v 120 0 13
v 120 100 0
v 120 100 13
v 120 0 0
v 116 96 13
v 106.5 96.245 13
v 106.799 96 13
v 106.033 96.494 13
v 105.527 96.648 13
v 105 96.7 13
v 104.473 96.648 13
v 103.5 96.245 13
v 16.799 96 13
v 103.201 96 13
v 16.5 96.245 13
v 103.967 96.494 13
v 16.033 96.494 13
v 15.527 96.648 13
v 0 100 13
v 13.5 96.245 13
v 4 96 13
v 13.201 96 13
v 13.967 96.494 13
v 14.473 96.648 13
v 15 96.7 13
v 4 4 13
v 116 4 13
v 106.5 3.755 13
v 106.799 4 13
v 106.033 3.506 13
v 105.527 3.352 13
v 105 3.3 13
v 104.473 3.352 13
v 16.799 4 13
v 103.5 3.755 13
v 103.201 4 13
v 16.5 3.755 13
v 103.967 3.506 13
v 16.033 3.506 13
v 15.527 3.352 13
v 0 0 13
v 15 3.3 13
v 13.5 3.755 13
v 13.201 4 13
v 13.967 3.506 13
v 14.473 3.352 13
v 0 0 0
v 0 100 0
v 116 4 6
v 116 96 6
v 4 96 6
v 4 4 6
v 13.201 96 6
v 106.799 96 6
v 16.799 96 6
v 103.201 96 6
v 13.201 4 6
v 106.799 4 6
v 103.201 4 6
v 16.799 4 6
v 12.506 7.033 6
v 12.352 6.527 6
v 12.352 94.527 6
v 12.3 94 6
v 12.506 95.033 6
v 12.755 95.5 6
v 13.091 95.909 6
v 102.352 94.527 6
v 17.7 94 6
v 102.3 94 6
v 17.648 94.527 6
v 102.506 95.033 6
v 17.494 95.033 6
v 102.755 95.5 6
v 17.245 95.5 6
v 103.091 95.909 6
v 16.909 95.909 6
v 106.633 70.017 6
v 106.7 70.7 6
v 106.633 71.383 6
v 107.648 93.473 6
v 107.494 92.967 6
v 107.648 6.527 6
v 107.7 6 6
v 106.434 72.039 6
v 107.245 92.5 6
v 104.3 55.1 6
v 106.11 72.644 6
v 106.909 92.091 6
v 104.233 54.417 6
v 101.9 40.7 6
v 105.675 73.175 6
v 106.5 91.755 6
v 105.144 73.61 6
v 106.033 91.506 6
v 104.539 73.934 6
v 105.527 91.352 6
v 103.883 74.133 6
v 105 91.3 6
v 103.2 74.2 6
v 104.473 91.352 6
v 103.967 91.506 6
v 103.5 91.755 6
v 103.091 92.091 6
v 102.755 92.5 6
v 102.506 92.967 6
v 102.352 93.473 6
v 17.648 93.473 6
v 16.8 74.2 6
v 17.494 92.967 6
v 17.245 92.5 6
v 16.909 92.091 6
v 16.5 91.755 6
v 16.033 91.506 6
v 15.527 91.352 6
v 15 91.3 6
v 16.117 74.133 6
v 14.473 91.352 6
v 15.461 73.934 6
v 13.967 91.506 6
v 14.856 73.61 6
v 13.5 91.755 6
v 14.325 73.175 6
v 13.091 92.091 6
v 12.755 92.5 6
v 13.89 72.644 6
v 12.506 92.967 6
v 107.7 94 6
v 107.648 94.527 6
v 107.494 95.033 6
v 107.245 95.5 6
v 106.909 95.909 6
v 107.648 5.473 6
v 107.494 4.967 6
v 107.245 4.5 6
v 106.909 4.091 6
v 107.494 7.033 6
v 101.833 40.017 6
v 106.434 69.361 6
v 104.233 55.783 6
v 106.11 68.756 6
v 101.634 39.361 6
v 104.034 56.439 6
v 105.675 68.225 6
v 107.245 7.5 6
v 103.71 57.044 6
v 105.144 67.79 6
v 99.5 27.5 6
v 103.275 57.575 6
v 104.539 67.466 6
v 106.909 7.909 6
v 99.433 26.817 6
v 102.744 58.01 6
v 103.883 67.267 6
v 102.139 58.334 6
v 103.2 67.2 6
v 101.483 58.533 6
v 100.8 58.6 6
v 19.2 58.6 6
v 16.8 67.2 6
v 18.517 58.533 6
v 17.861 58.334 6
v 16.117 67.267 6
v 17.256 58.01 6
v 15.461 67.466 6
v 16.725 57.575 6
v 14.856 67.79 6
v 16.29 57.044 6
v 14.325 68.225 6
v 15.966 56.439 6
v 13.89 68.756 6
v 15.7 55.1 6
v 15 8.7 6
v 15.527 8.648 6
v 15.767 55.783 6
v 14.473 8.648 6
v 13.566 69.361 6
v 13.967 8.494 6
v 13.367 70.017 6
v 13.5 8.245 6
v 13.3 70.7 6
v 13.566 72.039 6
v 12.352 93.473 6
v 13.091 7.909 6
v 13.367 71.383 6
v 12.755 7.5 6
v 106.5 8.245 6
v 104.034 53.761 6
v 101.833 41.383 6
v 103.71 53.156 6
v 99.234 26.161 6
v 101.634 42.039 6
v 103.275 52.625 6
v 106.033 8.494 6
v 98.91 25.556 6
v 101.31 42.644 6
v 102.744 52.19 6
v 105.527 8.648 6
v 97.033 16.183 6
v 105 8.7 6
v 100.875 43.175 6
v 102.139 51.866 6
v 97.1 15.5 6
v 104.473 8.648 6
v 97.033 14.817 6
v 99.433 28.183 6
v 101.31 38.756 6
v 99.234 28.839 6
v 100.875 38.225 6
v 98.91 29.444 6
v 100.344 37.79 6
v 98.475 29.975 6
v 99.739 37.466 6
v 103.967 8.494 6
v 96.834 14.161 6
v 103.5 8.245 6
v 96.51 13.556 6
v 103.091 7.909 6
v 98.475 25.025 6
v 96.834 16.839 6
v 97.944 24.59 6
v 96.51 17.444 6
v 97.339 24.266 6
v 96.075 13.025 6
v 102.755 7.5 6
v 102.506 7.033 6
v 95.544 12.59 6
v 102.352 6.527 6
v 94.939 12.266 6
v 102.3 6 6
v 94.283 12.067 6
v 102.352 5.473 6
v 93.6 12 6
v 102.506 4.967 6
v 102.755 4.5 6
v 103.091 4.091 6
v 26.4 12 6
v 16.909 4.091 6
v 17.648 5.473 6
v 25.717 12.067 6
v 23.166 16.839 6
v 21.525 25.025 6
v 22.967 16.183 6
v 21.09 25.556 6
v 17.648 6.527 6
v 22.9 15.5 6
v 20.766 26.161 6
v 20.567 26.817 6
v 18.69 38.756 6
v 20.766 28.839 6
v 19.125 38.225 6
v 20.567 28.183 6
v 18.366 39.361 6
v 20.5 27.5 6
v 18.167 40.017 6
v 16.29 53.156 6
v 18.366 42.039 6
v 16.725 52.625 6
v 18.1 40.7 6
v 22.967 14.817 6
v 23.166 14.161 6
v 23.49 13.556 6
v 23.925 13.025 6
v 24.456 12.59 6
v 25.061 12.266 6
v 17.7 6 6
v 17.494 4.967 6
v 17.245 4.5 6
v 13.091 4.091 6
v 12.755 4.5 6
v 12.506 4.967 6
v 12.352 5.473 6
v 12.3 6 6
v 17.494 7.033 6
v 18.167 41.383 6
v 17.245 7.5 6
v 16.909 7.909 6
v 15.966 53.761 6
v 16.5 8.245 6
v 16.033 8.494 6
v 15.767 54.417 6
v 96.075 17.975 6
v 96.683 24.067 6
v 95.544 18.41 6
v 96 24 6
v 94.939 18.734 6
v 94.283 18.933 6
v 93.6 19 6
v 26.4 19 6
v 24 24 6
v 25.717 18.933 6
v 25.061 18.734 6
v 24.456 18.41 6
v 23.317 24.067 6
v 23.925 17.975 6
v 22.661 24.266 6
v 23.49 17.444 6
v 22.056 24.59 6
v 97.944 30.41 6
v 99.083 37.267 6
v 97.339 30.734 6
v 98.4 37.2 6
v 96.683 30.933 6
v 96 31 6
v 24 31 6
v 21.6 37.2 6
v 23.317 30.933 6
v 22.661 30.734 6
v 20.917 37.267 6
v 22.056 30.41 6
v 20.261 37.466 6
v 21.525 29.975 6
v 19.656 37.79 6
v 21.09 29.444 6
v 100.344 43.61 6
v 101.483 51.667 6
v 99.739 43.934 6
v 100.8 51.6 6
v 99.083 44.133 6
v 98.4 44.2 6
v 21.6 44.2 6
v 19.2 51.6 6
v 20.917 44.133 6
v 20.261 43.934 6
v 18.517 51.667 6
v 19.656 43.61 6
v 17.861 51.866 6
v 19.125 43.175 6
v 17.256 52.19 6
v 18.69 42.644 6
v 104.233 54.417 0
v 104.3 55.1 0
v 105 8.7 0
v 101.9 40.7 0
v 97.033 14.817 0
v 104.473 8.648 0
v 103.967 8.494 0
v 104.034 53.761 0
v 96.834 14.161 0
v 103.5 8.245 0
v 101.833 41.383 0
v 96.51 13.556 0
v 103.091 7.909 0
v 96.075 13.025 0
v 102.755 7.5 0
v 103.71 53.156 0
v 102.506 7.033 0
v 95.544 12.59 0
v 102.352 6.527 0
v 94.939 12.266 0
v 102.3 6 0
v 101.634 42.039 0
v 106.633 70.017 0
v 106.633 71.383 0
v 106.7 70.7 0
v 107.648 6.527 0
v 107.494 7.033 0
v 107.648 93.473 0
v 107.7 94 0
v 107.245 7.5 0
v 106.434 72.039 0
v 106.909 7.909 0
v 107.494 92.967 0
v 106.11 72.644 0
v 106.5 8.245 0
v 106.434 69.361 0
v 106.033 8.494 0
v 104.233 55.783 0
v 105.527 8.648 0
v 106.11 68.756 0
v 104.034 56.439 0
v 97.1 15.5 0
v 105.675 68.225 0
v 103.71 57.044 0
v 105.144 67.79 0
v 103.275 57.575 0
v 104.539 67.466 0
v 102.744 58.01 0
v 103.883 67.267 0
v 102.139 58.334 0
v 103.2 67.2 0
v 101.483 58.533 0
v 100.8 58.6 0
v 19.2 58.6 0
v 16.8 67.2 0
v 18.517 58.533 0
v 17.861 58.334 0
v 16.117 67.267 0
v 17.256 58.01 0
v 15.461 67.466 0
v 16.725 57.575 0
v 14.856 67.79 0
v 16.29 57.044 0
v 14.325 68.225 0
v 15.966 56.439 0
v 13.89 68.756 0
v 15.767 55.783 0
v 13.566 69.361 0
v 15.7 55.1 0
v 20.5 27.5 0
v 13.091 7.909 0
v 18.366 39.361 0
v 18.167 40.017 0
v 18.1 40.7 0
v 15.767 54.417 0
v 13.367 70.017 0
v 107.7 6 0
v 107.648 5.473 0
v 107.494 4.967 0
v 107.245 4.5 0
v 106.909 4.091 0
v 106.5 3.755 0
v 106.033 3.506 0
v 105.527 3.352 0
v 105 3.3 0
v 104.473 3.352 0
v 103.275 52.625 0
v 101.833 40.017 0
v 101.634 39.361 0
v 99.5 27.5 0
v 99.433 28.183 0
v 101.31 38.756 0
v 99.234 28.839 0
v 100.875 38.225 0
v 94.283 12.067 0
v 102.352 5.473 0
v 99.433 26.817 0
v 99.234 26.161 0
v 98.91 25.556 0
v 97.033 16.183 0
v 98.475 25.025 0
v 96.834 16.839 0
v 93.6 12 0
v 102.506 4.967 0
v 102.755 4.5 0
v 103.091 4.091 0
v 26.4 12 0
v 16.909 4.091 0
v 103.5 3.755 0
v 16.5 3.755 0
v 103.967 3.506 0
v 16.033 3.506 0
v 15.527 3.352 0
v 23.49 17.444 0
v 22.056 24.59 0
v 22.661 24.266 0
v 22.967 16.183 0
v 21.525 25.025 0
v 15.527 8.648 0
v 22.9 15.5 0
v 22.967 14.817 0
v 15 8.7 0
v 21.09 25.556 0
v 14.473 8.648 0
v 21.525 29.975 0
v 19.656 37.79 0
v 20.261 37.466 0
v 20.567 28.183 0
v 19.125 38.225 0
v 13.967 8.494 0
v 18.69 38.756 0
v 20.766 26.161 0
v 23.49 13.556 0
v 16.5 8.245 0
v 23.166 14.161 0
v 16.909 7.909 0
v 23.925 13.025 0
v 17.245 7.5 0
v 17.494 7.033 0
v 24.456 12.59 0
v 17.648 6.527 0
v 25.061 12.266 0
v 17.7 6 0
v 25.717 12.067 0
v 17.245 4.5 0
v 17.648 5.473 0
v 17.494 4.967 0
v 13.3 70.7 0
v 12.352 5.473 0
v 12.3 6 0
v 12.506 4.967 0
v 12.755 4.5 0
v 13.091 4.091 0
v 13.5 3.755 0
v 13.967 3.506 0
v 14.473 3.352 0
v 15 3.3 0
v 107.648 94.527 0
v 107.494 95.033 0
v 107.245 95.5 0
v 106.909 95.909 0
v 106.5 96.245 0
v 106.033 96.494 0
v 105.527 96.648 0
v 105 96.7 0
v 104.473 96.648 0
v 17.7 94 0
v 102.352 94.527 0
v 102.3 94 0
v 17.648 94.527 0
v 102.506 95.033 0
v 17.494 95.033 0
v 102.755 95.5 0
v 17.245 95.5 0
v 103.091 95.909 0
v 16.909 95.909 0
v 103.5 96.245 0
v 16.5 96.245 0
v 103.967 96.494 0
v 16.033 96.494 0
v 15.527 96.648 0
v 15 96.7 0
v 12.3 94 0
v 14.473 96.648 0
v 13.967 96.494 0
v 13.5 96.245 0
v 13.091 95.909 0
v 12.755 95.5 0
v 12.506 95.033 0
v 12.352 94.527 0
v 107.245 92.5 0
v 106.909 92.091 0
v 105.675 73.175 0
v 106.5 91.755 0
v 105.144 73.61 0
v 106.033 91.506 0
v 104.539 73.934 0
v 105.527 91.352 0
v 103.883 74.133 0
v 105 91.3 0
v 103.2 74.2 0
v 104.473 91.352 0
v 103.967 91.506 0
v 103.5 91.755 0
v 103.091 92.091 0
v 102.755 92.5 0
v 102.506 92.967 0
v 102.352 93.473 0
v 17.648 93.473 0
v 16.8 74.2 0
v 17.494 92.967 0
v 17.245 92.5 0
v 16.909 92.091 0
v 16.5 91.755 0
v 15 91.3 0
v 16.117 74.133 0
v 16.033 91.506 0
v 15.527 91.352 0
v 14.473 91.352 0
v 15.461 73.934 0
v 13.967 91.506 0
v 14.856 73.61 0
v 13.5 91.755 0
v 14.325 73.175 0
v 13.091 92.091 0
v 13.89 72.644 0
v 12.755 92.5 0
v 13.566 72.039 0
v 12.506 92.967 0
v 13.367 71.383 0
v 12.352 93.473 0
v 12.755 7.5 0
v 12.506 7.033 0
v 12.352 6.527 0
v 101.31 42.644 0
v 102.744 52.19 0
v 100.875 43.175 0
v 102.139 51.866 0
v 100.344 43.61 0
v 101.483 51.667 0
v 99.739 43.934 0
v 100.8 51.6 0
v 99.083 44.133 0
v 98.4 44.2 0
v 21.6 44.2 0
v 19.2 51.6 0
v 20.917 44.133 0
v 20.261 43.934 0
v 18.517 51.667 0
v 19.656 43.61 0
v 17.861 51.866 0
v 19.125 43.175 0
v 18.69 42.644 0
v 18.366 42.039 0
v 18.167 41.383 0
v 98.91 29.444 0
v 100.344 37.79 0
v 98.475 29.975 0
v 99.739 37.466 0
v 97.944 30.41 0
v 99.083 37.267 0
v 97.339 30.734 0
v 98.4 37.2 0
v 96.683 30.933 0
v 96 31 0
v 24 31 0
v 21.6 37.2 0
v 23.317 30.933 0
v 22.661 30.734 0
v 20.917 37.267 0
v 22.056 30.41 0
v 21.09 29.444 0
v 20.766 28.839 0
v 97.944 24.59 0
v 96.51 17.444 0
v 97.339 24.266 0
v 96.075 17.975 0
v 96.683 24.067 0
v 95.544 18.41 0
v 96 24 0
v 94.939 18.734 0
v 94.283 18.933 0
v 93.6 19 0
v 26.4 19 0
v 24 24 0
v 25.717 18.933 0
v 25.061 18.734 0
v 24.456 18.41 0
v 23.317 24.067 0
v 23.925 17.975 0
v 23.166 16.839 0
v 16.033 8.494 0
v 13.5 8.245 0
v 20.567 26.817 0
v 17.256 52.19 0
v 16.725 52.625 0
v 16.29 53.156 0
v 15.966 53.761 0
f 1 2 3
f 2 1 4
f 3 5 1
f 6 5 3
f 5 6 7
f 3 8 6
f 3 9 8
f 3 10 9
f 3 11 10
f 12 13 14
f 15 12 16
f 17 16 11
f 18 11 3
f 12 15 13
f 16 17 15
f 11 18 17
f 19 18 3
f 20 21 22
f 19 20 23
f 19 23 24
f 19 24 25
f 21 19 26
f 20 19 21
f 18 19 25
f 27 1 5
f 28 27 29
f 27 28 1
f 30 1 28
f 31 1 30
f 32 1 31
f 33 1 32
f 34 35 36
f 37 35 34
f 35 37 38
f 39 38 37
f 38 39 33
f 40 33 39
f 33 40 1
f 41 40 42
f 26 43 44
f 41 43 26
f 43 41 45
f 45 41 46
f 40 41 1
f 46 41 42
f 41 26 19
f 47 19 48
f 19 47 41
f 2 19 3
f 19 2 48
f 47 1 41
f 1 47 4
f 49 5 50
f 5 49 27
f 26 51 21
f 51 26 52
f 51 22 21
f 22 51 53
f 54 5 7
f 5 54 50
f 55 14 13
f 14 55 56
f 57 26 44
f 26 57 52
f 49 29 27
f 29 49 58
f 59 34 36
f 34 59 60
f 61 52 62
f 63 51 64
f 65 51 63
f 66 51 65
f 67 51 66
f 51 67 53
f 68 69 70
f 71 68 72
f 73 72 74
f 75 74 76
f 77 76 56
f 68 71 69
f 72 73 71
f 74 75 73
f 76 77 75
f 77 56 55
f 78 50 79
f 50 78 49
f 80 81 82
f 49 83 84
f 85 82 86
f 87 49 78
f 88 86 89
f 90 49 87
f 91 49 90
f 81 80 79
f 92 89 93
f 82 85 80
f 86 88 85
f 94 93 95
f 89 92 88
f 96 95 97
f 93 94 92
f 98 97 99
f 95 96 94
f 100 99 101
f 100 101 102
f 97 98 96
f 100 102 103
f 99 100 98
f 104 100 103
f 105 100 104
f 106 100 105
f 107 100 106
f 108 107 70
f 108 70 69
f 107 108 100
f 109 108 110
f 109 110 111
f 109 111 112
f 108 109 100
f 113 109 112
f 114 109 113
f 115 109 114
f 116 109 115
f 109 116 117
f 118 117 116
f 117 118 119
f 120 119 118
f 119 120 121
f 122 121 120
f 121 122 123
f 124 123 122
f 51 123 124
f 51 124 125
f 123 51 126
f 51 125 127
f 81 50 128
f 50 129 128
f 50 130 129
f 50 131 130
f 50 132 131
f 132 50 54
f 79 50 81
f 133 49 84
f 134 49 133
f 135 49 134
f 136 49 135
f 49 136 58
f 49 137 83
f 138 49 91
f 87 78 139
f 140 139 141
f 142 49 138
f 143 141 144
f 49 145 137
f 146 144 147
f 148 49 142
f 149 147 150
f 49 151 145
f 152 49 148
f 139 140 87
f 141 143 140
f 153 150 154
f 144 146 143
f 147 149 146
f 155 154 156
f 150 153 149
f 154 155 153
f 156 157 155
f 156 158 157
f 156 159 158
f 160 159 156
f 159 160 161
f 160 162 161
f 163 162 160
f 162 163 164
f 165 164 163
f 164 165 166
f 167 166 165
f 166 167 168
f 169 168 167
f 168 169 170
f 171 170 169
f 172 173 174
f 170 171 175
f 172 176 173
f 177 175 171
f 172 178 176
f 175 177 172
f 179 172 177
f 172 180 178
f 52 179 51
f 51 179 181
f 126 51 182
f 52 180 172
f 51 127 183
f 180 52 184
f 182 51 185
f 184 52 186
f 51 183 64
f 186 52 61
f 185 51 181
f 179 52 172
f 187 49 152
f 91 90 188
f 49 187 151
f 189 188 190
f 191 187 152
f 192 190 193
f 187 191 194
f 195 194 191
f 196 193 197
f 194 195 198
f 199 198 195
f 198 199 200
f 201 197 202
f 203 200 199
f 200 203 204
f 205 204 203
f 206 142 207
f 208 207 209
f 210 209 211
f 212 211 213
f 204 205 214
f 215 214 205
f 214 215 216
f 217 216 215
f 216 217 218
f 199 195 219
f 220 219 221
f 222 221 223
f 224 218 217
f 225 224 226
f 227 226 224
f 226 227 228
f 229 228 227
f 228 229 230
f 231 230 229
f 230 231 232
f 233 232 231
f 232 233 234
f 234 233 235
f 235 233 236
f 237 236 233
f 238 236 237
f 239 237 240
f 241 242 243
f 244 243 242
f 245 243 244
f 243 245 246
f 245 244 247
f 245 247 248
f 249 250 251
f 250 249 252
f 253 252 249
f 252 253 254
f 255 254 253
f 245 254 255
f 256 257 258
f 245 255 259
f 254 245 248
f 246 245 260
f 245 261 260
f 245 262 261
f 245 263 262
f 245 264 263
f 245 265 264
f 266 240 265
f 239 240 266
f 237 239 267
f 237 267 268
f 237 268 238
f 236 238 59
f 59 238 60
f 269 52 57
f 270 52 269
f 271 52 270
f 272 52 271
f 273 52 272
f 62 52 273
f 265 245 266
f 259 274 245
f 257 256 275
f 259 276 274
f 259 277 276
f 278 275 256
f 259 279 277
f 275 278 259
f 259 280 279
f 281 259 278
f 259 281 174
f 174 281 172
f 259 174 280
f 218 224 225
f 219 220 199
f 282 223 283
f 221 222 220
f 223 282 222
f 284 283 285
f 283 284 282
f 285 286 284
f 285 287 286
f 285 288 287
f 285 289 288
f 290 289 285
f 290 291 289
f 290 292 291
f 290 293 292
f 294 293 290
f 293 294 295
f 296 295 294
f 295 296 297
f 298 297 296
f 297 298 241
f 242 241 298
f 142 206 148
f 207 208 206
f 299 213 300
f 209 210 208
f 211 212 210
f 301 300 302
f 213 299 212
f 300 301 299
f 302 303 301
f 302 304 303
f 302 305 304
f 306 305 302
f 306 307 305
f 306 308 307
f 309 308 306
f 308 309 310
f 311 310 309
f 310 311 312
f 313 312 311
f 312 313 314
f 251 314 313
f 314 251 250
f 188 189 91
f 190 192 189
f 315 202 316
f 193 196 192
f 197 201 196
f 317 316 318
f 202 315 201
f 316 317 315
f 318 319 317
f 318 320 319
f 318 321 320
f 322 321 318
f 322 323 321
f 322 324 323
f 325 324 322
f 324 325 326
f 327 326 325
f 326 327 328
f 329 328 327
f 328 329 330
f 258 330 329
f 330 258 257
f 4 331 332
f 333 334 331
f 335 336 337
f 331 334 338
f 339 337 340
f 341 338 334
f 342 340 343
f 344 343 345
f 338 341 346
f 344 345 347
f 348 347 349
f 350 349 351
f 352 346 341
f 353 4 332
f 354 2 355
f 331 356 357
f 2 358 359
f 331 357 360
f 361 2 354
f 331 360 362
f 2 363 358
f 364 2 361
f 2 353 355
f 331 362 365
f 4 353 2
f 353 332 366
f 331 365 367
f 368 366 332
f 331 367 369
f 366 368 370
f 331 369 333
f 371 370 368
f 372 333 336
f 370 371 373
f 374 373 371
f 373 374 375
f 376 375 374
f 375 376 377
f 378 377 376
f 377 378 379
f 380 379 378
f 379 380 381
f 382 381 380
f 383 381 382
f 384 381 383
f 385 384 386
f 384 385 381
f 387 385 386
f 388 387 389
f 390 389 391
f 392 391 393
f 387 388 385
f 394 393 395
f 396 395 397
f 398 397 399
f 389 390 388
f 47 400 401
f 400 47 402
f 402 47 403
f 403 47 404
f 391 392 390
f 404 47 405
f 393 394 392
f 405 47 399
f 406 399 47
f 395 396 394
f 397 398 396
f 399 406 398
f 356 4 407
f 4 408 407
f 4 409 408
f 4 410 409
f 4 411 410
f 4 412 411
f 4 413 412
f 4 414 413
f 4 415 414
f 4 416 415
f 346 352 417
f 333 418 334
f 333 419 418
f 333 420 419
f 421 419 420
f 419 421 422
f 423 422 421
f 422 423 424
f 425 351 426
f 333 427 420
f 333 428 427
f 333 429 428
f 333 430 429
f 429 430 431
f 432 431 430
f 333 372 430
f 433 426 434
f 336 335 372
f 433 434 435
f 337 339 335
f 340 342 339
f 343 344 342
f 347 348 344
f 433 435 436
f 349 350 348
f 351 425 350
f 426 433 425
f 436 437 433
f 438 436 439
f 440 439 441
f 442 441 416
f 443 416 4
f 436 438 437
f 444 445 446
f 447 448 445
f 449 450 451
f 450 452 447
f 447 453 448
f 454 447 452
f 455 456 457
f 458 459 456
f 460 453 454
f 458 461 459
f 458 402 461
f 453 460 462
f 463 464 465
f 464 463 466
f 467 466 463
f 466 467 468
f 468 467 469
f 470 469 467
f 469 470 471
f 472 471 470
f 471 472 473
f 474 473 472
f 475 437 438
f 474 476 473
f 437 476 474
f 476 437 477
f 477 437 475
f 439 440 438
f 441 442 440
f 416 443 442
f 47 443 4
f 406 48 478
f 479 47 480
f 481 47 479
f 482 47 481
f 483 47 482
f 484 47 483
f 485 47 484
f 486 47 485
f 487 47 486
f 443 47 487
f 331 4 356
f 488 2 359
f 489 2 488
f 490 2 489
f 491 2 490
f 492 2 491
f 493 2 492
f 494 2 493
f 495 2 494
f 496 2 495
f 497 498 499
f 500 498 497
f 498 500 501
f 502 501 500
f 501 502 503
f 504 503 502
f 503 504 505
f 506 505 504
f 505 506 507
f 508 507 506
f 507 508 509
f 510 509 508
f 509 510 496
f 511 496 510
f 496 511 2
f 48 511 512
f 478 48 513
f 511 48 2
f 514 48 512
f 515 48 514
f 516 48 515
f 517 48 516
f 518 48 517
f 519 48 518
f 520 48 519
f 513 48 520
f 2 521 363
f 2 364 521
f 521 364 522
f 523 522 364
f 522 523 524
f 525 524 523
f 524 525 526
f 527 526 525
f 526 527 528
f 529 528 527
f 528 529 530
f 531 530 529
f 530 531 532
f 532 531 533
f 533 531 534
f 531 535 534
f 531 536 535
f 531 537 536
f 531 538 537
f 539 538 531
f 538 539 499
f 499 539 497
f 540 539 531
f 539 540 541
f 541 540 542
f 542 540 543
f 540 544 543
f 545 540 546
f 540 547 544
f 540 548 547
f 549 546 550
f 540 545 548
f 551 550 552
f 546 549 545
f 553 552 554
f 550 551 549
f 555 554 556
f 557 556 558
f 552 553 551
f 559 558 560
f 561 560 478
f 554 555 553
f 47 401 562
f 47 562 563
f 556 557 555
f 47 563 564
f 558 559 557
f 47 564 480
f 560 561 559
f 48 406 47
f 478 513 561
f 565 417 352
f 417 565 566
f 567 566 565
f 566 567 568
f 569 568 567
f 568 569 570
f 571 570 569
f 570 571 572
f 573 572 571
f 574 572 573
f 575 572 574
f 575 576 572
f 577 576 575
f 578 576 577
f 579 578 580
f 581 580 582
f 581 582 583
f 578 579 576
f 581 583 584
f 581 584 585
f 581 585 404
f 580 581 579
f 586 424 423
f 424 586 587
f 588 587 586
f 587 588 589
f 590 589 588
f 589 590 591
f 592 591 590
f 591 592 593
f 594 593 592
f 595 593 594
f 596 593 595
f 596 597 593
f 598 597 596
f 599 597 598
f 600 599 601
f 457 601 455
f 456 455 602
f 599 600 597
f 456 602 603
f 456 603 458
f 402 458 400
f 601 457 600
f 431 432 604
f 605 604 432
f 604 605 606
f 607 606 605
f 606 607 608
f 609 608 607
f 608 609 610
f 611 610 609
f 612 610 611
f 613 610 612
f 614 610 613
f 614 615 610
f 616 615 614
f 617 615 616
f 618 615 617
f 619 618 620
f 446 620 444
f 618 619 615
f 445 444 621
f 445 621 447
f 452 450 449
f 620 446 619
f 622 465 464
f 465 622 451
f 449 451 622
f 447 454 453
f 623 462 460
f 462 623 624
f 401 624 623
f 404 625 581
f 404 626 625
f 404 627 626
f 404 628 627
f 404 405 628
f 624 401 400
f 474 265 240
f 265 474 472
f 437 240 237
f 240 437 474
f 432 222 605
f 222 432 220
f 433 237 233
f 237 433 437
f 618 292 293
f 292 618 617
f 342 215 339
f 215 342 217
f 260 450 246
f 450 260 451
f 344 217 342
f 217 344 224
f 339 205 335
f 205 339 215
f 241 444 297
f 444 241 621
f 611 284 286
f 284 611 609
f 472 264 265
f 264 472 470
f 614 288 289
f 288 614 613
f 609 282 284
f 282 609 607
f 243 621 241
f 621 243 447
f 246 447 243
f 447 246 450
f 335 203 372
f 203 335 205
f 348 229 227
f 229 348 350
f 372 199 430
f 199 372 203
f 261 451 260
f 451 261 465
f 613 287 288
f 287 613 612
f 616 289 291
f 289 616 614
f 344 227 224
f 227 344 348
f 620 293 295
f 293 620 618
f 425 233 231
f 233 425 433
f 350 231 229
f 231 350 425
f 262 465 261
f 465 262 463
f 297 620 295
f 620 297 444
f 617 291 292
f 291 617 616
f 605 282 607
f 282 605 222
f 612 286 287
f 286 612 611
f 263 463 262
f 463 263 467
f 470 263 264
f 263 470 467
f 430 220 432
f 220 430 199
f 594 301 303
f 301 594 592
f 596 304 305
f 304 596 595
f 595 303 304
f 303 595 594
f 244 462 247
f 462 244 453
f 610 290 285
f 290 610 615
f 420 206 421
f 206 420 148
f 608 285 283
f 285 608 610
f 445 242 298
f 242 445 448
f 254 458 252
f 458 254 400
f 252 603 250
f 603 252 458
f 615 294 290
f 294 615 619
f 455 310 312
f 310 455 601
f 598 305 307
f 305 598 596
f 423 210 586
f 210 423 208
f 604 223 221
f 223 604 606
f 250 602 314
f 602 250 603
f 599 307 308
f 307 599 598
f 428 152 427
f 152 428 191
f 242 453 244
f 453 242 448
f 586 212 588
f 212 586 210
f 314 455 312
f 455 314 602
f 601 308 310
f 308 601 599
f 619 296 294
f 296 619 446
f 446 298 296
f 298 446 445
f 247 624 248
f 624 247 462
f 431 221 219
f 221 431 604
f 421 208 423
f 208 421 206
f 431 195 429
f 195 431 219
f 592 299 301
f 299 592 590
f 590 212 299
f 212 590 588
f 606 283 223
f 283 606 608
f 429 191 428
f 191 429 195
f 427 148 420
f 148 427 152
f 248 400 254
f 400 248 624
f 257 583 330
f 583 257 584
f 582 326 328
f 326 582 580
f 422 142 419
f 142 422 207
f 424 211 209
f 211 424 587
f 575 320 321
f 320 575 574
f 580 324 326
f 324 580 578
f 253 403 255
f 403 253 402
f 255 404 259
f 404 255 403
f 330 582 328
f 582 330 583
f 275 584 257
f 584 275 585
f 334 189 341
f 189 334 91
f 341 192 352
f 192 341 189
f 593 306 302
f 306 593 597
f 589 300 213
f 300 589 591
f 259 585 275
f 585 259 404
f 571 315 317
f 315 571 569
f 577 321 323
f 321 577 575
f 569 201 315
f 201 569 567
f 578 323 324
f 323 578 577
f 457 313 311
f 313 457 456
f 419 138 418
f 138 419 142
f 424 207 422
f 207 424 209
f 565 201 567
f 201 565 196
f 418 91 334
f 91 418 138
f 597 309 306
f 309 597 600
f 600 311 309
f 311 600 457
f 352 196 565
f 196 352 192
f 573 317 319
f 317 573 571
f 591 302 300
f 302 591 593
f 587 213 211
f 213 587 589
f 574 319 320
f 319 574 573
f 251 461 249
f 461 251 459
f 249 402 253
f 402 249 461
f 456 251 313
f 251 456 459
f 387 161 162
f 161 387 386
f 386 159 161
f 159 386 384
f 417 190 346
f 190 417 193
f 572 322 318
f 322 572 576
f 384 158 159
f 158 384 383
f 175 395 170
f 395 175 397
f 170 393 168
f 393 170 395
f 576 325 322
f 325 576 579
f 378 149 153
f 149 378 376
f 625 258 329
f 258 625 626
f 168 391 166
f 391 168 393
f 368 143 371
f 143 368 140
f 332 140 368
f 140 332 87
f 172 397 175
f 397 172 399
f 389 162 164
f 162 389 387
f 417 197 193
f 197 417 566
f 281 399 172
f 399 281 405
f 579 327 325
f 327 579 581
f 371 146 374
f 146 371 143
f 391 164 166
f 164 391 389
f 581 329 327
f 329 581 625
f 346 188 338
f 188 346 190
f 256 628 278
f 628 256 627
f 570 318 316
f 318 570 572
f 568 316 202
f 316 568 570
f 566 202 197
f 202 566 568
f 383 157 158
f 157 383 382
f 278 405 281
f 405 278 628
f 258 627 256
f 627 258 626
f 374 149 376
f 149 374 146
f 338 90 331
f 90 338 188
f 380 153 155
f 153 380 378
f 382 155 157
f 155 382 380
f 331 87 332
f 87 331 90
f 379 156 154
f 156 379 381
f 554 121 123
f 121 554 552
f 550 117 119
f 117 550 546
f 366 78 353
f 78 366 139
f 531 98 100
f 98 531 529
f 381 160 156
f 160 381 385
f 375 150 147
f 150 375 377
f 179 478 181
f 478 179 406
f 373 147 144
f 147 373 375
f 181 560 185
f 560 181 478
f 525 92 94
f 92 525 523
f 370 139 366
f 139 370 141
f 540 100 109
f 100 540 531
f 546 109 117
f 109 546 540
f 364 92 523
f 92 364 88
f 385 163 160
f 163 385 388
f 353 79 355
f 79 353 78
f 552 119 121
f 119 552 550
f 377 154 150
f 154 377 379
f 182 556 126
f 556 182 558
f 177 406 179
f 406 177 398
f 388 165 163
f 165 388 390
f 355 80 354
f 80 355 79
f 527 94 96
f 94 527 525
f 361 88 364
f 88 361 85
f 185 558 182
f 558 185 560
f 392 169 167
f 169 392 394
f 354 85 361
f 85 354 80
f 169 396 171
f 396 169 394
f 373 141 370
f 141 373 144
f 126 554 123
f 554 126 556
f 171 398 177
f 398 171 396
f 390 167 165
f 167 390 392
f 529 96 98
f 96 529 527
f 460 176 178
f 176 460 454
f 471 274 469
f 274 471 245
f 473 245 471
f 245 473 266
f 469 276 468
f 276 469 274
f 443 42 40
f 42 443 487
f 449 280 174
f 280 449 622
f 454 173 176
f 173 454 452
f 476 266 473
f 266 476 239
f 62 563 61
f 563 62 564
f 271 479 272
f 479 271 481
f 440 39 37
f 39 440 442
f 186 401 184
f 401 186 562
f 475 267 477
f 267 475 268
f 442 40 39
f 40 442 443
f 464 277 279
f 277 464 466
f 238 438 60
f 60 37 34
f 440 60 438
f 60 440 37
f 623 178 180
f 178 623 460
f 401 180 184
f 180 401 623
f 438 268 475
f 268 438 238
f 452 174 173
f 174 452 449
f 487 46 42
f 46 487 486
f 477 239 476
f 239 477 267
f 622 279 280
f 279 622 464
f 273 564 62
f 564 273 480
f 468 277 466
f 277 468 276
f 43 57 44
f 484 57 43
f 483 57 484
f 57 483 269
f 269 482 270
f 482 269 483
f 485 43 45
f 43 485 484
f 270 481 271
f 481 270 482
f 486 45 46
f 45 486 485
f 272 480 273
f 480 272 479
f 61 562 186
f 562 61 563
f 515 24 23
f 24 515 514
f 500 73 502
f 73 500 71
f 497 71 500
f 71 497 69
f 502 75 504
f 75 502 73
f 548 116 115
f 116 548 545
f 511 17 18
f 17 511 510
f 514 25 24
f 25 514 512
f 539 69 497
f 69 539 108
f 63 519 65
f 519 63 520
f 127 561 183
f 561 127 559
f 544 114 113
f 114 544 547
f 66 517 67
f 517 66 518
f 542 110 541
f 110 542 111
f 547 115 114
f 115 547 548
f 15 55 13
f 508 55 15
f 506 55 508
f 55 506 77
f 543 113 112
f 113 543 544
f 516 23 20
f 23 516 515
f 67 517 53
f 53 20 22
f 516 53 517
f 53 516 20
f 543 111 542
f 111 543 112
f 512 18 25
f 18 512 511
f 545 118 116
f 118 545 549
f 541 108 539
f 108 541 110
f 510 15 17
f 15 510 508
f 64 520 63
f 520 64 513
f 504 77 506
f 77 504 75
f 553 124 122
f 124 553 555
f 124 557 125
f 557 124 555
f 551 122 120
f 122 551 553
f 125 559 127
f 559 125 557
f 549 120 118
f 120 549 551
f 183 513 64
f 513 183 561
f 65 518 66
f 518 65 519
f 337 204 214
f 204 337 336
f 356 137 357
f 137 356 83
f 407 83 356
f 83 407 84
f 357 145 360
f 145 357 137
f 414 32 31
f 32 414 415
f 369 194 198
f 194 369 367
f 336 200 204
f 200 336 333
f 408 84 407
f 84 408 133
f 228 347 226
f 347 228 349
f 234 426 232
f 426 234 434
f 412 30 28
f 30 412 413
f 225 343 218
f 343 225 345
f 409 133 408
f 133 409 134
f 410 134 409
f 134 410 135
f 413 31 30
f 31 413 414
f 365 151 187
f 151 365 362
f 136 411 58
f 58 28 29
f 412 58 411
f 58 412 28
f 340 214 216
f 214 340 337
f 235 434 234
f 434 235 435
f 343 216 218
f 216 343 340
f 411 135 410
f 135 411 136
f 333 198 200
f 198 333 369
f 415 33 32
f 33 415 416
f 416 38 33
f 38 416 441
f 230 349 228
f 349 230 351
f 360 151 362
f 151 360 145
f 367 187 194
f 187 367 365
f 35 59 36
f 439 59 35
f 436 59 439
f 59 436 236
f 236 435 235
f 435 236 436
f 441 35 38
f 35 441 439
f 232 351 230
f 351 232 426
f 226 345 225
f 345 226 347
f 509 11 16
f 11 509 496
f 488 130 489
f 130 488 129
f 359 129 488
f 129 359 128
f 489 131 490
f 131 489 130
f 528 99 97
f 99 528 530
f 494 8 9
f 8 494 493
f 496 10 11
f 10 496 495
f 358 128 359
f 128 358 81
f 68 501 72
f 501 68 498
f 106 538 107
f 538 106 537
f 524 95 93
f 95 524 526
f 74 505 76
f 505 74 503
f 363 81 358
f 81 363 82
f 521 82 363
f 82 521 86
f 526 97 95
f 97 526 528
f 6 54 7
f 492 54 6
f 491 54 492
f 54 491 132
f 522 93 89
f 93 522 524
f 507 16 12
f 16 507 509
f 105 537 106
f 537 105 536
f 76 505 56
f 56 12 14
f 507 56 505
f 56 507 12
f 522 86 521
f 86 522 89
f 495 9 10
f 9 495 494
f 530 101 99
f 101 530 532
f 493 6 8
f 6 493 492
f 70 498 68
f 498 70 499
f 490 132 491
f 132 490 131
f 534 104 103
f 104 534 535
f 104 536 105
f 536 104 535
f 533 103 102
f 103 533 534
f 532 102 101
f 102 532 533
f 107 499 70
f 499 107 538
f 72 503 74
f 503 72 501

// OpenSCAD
$fn = 32;

// ----------------------------------------------------------------------
// Slotted panel: 120 x 100 mm, 5 рядов of slots
// ----------------------------------------------------------------------

// --- parameters (mm) ---
panel_w = 120;            // panel width
panel_d = 100;            // panel depth
thick = 6;                // panel thickness
slot_w = 7;               // slot width
pitch0 = 12;              // first row pitch
pitch_step = 1.2;         // pitch increase per row
margin = 12;              // margin around the slot field
rows = 5;                 // number of slot rows
mount_d = 5.4;            // mounting holes
mount_x = 45;             // mounting hole offset
rim_h = 13;               // rim height
rim_t = 4;                // rim wall thickness

difference() {
  union() {
    cube([panel_w, panel_d, thick]);
    translate([0, 0, thick - 1]) difference() {
      cube([panel_w, panel_d, rim_h - thick + 1]);
      translate([rim_t, rim_t, -2.5]) cube([panel_w - 2 * rim_t, panel_d - 2 * rim_t, rim_h - thick + 6]);
    }
  }
  /* slot rows: stadium shaped cutters, 2.5 mm clear of both faces */
  /* row 0: pitch 12, length 67.2 */
  hull() {
    translate([26.4, 15.5, -2.5]) cylinder(h = thick + 5, d = slot_w);
    translate([93.6, 15.5, -2.5]) cylinder(h = thick + 5, d = slot_w);
  }
  /* row 1: pitch 13.2, length 72 */
  hull() {
    translate([24, 27.5, -2.5]) cylinder(h = thick + 5, d = slot_w);
    translate([96, 27.5, -2.5]) cylinder(h = thick + 5, d = slot_w);
  }
  /* row 2: pitch 14.4, length 76.8 */
  hull() {
    translate([21.6, 40.7, -2.5]) cylinder(h = thick + 5, d = slot_w);
    translate([98.4, 40.7, -2.5]) cylinder(h = thick + 5, d = slot_w);
  }
  /* row 3: pitch 15.6, length 81.6 */
  hull() {
    translate([19.2, 55.1, -2.5]) cylinder(h = thick + 5, d = slot_w);
    translate([100.8, 55.1, -2.5]) cylinder(h = thick + 5, d = slot_w);
  }
  /* row 4: pitch 16.8, length 86.4 */
  hull() {
    translate([16.8, 70.7, -2.5]) cylinder(h = thick + 5, d = slot_w);
    translate([103.2, 70.7, -2.5]) cylinder(h = thick + 5, d = slot_w);
  }
  translate([15, 6, -2.5]) cylinder(h = 18, d = mount_d);
  translate([15, 94, -2.5]) cylinder(h = 18, d = mount_d);
  translate([105, 6, -2.5]) cylinder(h = 18, d = mount_d);
  translate([105, 94, -2.5]) cylinder(h = 18, d = mount_d);
}
